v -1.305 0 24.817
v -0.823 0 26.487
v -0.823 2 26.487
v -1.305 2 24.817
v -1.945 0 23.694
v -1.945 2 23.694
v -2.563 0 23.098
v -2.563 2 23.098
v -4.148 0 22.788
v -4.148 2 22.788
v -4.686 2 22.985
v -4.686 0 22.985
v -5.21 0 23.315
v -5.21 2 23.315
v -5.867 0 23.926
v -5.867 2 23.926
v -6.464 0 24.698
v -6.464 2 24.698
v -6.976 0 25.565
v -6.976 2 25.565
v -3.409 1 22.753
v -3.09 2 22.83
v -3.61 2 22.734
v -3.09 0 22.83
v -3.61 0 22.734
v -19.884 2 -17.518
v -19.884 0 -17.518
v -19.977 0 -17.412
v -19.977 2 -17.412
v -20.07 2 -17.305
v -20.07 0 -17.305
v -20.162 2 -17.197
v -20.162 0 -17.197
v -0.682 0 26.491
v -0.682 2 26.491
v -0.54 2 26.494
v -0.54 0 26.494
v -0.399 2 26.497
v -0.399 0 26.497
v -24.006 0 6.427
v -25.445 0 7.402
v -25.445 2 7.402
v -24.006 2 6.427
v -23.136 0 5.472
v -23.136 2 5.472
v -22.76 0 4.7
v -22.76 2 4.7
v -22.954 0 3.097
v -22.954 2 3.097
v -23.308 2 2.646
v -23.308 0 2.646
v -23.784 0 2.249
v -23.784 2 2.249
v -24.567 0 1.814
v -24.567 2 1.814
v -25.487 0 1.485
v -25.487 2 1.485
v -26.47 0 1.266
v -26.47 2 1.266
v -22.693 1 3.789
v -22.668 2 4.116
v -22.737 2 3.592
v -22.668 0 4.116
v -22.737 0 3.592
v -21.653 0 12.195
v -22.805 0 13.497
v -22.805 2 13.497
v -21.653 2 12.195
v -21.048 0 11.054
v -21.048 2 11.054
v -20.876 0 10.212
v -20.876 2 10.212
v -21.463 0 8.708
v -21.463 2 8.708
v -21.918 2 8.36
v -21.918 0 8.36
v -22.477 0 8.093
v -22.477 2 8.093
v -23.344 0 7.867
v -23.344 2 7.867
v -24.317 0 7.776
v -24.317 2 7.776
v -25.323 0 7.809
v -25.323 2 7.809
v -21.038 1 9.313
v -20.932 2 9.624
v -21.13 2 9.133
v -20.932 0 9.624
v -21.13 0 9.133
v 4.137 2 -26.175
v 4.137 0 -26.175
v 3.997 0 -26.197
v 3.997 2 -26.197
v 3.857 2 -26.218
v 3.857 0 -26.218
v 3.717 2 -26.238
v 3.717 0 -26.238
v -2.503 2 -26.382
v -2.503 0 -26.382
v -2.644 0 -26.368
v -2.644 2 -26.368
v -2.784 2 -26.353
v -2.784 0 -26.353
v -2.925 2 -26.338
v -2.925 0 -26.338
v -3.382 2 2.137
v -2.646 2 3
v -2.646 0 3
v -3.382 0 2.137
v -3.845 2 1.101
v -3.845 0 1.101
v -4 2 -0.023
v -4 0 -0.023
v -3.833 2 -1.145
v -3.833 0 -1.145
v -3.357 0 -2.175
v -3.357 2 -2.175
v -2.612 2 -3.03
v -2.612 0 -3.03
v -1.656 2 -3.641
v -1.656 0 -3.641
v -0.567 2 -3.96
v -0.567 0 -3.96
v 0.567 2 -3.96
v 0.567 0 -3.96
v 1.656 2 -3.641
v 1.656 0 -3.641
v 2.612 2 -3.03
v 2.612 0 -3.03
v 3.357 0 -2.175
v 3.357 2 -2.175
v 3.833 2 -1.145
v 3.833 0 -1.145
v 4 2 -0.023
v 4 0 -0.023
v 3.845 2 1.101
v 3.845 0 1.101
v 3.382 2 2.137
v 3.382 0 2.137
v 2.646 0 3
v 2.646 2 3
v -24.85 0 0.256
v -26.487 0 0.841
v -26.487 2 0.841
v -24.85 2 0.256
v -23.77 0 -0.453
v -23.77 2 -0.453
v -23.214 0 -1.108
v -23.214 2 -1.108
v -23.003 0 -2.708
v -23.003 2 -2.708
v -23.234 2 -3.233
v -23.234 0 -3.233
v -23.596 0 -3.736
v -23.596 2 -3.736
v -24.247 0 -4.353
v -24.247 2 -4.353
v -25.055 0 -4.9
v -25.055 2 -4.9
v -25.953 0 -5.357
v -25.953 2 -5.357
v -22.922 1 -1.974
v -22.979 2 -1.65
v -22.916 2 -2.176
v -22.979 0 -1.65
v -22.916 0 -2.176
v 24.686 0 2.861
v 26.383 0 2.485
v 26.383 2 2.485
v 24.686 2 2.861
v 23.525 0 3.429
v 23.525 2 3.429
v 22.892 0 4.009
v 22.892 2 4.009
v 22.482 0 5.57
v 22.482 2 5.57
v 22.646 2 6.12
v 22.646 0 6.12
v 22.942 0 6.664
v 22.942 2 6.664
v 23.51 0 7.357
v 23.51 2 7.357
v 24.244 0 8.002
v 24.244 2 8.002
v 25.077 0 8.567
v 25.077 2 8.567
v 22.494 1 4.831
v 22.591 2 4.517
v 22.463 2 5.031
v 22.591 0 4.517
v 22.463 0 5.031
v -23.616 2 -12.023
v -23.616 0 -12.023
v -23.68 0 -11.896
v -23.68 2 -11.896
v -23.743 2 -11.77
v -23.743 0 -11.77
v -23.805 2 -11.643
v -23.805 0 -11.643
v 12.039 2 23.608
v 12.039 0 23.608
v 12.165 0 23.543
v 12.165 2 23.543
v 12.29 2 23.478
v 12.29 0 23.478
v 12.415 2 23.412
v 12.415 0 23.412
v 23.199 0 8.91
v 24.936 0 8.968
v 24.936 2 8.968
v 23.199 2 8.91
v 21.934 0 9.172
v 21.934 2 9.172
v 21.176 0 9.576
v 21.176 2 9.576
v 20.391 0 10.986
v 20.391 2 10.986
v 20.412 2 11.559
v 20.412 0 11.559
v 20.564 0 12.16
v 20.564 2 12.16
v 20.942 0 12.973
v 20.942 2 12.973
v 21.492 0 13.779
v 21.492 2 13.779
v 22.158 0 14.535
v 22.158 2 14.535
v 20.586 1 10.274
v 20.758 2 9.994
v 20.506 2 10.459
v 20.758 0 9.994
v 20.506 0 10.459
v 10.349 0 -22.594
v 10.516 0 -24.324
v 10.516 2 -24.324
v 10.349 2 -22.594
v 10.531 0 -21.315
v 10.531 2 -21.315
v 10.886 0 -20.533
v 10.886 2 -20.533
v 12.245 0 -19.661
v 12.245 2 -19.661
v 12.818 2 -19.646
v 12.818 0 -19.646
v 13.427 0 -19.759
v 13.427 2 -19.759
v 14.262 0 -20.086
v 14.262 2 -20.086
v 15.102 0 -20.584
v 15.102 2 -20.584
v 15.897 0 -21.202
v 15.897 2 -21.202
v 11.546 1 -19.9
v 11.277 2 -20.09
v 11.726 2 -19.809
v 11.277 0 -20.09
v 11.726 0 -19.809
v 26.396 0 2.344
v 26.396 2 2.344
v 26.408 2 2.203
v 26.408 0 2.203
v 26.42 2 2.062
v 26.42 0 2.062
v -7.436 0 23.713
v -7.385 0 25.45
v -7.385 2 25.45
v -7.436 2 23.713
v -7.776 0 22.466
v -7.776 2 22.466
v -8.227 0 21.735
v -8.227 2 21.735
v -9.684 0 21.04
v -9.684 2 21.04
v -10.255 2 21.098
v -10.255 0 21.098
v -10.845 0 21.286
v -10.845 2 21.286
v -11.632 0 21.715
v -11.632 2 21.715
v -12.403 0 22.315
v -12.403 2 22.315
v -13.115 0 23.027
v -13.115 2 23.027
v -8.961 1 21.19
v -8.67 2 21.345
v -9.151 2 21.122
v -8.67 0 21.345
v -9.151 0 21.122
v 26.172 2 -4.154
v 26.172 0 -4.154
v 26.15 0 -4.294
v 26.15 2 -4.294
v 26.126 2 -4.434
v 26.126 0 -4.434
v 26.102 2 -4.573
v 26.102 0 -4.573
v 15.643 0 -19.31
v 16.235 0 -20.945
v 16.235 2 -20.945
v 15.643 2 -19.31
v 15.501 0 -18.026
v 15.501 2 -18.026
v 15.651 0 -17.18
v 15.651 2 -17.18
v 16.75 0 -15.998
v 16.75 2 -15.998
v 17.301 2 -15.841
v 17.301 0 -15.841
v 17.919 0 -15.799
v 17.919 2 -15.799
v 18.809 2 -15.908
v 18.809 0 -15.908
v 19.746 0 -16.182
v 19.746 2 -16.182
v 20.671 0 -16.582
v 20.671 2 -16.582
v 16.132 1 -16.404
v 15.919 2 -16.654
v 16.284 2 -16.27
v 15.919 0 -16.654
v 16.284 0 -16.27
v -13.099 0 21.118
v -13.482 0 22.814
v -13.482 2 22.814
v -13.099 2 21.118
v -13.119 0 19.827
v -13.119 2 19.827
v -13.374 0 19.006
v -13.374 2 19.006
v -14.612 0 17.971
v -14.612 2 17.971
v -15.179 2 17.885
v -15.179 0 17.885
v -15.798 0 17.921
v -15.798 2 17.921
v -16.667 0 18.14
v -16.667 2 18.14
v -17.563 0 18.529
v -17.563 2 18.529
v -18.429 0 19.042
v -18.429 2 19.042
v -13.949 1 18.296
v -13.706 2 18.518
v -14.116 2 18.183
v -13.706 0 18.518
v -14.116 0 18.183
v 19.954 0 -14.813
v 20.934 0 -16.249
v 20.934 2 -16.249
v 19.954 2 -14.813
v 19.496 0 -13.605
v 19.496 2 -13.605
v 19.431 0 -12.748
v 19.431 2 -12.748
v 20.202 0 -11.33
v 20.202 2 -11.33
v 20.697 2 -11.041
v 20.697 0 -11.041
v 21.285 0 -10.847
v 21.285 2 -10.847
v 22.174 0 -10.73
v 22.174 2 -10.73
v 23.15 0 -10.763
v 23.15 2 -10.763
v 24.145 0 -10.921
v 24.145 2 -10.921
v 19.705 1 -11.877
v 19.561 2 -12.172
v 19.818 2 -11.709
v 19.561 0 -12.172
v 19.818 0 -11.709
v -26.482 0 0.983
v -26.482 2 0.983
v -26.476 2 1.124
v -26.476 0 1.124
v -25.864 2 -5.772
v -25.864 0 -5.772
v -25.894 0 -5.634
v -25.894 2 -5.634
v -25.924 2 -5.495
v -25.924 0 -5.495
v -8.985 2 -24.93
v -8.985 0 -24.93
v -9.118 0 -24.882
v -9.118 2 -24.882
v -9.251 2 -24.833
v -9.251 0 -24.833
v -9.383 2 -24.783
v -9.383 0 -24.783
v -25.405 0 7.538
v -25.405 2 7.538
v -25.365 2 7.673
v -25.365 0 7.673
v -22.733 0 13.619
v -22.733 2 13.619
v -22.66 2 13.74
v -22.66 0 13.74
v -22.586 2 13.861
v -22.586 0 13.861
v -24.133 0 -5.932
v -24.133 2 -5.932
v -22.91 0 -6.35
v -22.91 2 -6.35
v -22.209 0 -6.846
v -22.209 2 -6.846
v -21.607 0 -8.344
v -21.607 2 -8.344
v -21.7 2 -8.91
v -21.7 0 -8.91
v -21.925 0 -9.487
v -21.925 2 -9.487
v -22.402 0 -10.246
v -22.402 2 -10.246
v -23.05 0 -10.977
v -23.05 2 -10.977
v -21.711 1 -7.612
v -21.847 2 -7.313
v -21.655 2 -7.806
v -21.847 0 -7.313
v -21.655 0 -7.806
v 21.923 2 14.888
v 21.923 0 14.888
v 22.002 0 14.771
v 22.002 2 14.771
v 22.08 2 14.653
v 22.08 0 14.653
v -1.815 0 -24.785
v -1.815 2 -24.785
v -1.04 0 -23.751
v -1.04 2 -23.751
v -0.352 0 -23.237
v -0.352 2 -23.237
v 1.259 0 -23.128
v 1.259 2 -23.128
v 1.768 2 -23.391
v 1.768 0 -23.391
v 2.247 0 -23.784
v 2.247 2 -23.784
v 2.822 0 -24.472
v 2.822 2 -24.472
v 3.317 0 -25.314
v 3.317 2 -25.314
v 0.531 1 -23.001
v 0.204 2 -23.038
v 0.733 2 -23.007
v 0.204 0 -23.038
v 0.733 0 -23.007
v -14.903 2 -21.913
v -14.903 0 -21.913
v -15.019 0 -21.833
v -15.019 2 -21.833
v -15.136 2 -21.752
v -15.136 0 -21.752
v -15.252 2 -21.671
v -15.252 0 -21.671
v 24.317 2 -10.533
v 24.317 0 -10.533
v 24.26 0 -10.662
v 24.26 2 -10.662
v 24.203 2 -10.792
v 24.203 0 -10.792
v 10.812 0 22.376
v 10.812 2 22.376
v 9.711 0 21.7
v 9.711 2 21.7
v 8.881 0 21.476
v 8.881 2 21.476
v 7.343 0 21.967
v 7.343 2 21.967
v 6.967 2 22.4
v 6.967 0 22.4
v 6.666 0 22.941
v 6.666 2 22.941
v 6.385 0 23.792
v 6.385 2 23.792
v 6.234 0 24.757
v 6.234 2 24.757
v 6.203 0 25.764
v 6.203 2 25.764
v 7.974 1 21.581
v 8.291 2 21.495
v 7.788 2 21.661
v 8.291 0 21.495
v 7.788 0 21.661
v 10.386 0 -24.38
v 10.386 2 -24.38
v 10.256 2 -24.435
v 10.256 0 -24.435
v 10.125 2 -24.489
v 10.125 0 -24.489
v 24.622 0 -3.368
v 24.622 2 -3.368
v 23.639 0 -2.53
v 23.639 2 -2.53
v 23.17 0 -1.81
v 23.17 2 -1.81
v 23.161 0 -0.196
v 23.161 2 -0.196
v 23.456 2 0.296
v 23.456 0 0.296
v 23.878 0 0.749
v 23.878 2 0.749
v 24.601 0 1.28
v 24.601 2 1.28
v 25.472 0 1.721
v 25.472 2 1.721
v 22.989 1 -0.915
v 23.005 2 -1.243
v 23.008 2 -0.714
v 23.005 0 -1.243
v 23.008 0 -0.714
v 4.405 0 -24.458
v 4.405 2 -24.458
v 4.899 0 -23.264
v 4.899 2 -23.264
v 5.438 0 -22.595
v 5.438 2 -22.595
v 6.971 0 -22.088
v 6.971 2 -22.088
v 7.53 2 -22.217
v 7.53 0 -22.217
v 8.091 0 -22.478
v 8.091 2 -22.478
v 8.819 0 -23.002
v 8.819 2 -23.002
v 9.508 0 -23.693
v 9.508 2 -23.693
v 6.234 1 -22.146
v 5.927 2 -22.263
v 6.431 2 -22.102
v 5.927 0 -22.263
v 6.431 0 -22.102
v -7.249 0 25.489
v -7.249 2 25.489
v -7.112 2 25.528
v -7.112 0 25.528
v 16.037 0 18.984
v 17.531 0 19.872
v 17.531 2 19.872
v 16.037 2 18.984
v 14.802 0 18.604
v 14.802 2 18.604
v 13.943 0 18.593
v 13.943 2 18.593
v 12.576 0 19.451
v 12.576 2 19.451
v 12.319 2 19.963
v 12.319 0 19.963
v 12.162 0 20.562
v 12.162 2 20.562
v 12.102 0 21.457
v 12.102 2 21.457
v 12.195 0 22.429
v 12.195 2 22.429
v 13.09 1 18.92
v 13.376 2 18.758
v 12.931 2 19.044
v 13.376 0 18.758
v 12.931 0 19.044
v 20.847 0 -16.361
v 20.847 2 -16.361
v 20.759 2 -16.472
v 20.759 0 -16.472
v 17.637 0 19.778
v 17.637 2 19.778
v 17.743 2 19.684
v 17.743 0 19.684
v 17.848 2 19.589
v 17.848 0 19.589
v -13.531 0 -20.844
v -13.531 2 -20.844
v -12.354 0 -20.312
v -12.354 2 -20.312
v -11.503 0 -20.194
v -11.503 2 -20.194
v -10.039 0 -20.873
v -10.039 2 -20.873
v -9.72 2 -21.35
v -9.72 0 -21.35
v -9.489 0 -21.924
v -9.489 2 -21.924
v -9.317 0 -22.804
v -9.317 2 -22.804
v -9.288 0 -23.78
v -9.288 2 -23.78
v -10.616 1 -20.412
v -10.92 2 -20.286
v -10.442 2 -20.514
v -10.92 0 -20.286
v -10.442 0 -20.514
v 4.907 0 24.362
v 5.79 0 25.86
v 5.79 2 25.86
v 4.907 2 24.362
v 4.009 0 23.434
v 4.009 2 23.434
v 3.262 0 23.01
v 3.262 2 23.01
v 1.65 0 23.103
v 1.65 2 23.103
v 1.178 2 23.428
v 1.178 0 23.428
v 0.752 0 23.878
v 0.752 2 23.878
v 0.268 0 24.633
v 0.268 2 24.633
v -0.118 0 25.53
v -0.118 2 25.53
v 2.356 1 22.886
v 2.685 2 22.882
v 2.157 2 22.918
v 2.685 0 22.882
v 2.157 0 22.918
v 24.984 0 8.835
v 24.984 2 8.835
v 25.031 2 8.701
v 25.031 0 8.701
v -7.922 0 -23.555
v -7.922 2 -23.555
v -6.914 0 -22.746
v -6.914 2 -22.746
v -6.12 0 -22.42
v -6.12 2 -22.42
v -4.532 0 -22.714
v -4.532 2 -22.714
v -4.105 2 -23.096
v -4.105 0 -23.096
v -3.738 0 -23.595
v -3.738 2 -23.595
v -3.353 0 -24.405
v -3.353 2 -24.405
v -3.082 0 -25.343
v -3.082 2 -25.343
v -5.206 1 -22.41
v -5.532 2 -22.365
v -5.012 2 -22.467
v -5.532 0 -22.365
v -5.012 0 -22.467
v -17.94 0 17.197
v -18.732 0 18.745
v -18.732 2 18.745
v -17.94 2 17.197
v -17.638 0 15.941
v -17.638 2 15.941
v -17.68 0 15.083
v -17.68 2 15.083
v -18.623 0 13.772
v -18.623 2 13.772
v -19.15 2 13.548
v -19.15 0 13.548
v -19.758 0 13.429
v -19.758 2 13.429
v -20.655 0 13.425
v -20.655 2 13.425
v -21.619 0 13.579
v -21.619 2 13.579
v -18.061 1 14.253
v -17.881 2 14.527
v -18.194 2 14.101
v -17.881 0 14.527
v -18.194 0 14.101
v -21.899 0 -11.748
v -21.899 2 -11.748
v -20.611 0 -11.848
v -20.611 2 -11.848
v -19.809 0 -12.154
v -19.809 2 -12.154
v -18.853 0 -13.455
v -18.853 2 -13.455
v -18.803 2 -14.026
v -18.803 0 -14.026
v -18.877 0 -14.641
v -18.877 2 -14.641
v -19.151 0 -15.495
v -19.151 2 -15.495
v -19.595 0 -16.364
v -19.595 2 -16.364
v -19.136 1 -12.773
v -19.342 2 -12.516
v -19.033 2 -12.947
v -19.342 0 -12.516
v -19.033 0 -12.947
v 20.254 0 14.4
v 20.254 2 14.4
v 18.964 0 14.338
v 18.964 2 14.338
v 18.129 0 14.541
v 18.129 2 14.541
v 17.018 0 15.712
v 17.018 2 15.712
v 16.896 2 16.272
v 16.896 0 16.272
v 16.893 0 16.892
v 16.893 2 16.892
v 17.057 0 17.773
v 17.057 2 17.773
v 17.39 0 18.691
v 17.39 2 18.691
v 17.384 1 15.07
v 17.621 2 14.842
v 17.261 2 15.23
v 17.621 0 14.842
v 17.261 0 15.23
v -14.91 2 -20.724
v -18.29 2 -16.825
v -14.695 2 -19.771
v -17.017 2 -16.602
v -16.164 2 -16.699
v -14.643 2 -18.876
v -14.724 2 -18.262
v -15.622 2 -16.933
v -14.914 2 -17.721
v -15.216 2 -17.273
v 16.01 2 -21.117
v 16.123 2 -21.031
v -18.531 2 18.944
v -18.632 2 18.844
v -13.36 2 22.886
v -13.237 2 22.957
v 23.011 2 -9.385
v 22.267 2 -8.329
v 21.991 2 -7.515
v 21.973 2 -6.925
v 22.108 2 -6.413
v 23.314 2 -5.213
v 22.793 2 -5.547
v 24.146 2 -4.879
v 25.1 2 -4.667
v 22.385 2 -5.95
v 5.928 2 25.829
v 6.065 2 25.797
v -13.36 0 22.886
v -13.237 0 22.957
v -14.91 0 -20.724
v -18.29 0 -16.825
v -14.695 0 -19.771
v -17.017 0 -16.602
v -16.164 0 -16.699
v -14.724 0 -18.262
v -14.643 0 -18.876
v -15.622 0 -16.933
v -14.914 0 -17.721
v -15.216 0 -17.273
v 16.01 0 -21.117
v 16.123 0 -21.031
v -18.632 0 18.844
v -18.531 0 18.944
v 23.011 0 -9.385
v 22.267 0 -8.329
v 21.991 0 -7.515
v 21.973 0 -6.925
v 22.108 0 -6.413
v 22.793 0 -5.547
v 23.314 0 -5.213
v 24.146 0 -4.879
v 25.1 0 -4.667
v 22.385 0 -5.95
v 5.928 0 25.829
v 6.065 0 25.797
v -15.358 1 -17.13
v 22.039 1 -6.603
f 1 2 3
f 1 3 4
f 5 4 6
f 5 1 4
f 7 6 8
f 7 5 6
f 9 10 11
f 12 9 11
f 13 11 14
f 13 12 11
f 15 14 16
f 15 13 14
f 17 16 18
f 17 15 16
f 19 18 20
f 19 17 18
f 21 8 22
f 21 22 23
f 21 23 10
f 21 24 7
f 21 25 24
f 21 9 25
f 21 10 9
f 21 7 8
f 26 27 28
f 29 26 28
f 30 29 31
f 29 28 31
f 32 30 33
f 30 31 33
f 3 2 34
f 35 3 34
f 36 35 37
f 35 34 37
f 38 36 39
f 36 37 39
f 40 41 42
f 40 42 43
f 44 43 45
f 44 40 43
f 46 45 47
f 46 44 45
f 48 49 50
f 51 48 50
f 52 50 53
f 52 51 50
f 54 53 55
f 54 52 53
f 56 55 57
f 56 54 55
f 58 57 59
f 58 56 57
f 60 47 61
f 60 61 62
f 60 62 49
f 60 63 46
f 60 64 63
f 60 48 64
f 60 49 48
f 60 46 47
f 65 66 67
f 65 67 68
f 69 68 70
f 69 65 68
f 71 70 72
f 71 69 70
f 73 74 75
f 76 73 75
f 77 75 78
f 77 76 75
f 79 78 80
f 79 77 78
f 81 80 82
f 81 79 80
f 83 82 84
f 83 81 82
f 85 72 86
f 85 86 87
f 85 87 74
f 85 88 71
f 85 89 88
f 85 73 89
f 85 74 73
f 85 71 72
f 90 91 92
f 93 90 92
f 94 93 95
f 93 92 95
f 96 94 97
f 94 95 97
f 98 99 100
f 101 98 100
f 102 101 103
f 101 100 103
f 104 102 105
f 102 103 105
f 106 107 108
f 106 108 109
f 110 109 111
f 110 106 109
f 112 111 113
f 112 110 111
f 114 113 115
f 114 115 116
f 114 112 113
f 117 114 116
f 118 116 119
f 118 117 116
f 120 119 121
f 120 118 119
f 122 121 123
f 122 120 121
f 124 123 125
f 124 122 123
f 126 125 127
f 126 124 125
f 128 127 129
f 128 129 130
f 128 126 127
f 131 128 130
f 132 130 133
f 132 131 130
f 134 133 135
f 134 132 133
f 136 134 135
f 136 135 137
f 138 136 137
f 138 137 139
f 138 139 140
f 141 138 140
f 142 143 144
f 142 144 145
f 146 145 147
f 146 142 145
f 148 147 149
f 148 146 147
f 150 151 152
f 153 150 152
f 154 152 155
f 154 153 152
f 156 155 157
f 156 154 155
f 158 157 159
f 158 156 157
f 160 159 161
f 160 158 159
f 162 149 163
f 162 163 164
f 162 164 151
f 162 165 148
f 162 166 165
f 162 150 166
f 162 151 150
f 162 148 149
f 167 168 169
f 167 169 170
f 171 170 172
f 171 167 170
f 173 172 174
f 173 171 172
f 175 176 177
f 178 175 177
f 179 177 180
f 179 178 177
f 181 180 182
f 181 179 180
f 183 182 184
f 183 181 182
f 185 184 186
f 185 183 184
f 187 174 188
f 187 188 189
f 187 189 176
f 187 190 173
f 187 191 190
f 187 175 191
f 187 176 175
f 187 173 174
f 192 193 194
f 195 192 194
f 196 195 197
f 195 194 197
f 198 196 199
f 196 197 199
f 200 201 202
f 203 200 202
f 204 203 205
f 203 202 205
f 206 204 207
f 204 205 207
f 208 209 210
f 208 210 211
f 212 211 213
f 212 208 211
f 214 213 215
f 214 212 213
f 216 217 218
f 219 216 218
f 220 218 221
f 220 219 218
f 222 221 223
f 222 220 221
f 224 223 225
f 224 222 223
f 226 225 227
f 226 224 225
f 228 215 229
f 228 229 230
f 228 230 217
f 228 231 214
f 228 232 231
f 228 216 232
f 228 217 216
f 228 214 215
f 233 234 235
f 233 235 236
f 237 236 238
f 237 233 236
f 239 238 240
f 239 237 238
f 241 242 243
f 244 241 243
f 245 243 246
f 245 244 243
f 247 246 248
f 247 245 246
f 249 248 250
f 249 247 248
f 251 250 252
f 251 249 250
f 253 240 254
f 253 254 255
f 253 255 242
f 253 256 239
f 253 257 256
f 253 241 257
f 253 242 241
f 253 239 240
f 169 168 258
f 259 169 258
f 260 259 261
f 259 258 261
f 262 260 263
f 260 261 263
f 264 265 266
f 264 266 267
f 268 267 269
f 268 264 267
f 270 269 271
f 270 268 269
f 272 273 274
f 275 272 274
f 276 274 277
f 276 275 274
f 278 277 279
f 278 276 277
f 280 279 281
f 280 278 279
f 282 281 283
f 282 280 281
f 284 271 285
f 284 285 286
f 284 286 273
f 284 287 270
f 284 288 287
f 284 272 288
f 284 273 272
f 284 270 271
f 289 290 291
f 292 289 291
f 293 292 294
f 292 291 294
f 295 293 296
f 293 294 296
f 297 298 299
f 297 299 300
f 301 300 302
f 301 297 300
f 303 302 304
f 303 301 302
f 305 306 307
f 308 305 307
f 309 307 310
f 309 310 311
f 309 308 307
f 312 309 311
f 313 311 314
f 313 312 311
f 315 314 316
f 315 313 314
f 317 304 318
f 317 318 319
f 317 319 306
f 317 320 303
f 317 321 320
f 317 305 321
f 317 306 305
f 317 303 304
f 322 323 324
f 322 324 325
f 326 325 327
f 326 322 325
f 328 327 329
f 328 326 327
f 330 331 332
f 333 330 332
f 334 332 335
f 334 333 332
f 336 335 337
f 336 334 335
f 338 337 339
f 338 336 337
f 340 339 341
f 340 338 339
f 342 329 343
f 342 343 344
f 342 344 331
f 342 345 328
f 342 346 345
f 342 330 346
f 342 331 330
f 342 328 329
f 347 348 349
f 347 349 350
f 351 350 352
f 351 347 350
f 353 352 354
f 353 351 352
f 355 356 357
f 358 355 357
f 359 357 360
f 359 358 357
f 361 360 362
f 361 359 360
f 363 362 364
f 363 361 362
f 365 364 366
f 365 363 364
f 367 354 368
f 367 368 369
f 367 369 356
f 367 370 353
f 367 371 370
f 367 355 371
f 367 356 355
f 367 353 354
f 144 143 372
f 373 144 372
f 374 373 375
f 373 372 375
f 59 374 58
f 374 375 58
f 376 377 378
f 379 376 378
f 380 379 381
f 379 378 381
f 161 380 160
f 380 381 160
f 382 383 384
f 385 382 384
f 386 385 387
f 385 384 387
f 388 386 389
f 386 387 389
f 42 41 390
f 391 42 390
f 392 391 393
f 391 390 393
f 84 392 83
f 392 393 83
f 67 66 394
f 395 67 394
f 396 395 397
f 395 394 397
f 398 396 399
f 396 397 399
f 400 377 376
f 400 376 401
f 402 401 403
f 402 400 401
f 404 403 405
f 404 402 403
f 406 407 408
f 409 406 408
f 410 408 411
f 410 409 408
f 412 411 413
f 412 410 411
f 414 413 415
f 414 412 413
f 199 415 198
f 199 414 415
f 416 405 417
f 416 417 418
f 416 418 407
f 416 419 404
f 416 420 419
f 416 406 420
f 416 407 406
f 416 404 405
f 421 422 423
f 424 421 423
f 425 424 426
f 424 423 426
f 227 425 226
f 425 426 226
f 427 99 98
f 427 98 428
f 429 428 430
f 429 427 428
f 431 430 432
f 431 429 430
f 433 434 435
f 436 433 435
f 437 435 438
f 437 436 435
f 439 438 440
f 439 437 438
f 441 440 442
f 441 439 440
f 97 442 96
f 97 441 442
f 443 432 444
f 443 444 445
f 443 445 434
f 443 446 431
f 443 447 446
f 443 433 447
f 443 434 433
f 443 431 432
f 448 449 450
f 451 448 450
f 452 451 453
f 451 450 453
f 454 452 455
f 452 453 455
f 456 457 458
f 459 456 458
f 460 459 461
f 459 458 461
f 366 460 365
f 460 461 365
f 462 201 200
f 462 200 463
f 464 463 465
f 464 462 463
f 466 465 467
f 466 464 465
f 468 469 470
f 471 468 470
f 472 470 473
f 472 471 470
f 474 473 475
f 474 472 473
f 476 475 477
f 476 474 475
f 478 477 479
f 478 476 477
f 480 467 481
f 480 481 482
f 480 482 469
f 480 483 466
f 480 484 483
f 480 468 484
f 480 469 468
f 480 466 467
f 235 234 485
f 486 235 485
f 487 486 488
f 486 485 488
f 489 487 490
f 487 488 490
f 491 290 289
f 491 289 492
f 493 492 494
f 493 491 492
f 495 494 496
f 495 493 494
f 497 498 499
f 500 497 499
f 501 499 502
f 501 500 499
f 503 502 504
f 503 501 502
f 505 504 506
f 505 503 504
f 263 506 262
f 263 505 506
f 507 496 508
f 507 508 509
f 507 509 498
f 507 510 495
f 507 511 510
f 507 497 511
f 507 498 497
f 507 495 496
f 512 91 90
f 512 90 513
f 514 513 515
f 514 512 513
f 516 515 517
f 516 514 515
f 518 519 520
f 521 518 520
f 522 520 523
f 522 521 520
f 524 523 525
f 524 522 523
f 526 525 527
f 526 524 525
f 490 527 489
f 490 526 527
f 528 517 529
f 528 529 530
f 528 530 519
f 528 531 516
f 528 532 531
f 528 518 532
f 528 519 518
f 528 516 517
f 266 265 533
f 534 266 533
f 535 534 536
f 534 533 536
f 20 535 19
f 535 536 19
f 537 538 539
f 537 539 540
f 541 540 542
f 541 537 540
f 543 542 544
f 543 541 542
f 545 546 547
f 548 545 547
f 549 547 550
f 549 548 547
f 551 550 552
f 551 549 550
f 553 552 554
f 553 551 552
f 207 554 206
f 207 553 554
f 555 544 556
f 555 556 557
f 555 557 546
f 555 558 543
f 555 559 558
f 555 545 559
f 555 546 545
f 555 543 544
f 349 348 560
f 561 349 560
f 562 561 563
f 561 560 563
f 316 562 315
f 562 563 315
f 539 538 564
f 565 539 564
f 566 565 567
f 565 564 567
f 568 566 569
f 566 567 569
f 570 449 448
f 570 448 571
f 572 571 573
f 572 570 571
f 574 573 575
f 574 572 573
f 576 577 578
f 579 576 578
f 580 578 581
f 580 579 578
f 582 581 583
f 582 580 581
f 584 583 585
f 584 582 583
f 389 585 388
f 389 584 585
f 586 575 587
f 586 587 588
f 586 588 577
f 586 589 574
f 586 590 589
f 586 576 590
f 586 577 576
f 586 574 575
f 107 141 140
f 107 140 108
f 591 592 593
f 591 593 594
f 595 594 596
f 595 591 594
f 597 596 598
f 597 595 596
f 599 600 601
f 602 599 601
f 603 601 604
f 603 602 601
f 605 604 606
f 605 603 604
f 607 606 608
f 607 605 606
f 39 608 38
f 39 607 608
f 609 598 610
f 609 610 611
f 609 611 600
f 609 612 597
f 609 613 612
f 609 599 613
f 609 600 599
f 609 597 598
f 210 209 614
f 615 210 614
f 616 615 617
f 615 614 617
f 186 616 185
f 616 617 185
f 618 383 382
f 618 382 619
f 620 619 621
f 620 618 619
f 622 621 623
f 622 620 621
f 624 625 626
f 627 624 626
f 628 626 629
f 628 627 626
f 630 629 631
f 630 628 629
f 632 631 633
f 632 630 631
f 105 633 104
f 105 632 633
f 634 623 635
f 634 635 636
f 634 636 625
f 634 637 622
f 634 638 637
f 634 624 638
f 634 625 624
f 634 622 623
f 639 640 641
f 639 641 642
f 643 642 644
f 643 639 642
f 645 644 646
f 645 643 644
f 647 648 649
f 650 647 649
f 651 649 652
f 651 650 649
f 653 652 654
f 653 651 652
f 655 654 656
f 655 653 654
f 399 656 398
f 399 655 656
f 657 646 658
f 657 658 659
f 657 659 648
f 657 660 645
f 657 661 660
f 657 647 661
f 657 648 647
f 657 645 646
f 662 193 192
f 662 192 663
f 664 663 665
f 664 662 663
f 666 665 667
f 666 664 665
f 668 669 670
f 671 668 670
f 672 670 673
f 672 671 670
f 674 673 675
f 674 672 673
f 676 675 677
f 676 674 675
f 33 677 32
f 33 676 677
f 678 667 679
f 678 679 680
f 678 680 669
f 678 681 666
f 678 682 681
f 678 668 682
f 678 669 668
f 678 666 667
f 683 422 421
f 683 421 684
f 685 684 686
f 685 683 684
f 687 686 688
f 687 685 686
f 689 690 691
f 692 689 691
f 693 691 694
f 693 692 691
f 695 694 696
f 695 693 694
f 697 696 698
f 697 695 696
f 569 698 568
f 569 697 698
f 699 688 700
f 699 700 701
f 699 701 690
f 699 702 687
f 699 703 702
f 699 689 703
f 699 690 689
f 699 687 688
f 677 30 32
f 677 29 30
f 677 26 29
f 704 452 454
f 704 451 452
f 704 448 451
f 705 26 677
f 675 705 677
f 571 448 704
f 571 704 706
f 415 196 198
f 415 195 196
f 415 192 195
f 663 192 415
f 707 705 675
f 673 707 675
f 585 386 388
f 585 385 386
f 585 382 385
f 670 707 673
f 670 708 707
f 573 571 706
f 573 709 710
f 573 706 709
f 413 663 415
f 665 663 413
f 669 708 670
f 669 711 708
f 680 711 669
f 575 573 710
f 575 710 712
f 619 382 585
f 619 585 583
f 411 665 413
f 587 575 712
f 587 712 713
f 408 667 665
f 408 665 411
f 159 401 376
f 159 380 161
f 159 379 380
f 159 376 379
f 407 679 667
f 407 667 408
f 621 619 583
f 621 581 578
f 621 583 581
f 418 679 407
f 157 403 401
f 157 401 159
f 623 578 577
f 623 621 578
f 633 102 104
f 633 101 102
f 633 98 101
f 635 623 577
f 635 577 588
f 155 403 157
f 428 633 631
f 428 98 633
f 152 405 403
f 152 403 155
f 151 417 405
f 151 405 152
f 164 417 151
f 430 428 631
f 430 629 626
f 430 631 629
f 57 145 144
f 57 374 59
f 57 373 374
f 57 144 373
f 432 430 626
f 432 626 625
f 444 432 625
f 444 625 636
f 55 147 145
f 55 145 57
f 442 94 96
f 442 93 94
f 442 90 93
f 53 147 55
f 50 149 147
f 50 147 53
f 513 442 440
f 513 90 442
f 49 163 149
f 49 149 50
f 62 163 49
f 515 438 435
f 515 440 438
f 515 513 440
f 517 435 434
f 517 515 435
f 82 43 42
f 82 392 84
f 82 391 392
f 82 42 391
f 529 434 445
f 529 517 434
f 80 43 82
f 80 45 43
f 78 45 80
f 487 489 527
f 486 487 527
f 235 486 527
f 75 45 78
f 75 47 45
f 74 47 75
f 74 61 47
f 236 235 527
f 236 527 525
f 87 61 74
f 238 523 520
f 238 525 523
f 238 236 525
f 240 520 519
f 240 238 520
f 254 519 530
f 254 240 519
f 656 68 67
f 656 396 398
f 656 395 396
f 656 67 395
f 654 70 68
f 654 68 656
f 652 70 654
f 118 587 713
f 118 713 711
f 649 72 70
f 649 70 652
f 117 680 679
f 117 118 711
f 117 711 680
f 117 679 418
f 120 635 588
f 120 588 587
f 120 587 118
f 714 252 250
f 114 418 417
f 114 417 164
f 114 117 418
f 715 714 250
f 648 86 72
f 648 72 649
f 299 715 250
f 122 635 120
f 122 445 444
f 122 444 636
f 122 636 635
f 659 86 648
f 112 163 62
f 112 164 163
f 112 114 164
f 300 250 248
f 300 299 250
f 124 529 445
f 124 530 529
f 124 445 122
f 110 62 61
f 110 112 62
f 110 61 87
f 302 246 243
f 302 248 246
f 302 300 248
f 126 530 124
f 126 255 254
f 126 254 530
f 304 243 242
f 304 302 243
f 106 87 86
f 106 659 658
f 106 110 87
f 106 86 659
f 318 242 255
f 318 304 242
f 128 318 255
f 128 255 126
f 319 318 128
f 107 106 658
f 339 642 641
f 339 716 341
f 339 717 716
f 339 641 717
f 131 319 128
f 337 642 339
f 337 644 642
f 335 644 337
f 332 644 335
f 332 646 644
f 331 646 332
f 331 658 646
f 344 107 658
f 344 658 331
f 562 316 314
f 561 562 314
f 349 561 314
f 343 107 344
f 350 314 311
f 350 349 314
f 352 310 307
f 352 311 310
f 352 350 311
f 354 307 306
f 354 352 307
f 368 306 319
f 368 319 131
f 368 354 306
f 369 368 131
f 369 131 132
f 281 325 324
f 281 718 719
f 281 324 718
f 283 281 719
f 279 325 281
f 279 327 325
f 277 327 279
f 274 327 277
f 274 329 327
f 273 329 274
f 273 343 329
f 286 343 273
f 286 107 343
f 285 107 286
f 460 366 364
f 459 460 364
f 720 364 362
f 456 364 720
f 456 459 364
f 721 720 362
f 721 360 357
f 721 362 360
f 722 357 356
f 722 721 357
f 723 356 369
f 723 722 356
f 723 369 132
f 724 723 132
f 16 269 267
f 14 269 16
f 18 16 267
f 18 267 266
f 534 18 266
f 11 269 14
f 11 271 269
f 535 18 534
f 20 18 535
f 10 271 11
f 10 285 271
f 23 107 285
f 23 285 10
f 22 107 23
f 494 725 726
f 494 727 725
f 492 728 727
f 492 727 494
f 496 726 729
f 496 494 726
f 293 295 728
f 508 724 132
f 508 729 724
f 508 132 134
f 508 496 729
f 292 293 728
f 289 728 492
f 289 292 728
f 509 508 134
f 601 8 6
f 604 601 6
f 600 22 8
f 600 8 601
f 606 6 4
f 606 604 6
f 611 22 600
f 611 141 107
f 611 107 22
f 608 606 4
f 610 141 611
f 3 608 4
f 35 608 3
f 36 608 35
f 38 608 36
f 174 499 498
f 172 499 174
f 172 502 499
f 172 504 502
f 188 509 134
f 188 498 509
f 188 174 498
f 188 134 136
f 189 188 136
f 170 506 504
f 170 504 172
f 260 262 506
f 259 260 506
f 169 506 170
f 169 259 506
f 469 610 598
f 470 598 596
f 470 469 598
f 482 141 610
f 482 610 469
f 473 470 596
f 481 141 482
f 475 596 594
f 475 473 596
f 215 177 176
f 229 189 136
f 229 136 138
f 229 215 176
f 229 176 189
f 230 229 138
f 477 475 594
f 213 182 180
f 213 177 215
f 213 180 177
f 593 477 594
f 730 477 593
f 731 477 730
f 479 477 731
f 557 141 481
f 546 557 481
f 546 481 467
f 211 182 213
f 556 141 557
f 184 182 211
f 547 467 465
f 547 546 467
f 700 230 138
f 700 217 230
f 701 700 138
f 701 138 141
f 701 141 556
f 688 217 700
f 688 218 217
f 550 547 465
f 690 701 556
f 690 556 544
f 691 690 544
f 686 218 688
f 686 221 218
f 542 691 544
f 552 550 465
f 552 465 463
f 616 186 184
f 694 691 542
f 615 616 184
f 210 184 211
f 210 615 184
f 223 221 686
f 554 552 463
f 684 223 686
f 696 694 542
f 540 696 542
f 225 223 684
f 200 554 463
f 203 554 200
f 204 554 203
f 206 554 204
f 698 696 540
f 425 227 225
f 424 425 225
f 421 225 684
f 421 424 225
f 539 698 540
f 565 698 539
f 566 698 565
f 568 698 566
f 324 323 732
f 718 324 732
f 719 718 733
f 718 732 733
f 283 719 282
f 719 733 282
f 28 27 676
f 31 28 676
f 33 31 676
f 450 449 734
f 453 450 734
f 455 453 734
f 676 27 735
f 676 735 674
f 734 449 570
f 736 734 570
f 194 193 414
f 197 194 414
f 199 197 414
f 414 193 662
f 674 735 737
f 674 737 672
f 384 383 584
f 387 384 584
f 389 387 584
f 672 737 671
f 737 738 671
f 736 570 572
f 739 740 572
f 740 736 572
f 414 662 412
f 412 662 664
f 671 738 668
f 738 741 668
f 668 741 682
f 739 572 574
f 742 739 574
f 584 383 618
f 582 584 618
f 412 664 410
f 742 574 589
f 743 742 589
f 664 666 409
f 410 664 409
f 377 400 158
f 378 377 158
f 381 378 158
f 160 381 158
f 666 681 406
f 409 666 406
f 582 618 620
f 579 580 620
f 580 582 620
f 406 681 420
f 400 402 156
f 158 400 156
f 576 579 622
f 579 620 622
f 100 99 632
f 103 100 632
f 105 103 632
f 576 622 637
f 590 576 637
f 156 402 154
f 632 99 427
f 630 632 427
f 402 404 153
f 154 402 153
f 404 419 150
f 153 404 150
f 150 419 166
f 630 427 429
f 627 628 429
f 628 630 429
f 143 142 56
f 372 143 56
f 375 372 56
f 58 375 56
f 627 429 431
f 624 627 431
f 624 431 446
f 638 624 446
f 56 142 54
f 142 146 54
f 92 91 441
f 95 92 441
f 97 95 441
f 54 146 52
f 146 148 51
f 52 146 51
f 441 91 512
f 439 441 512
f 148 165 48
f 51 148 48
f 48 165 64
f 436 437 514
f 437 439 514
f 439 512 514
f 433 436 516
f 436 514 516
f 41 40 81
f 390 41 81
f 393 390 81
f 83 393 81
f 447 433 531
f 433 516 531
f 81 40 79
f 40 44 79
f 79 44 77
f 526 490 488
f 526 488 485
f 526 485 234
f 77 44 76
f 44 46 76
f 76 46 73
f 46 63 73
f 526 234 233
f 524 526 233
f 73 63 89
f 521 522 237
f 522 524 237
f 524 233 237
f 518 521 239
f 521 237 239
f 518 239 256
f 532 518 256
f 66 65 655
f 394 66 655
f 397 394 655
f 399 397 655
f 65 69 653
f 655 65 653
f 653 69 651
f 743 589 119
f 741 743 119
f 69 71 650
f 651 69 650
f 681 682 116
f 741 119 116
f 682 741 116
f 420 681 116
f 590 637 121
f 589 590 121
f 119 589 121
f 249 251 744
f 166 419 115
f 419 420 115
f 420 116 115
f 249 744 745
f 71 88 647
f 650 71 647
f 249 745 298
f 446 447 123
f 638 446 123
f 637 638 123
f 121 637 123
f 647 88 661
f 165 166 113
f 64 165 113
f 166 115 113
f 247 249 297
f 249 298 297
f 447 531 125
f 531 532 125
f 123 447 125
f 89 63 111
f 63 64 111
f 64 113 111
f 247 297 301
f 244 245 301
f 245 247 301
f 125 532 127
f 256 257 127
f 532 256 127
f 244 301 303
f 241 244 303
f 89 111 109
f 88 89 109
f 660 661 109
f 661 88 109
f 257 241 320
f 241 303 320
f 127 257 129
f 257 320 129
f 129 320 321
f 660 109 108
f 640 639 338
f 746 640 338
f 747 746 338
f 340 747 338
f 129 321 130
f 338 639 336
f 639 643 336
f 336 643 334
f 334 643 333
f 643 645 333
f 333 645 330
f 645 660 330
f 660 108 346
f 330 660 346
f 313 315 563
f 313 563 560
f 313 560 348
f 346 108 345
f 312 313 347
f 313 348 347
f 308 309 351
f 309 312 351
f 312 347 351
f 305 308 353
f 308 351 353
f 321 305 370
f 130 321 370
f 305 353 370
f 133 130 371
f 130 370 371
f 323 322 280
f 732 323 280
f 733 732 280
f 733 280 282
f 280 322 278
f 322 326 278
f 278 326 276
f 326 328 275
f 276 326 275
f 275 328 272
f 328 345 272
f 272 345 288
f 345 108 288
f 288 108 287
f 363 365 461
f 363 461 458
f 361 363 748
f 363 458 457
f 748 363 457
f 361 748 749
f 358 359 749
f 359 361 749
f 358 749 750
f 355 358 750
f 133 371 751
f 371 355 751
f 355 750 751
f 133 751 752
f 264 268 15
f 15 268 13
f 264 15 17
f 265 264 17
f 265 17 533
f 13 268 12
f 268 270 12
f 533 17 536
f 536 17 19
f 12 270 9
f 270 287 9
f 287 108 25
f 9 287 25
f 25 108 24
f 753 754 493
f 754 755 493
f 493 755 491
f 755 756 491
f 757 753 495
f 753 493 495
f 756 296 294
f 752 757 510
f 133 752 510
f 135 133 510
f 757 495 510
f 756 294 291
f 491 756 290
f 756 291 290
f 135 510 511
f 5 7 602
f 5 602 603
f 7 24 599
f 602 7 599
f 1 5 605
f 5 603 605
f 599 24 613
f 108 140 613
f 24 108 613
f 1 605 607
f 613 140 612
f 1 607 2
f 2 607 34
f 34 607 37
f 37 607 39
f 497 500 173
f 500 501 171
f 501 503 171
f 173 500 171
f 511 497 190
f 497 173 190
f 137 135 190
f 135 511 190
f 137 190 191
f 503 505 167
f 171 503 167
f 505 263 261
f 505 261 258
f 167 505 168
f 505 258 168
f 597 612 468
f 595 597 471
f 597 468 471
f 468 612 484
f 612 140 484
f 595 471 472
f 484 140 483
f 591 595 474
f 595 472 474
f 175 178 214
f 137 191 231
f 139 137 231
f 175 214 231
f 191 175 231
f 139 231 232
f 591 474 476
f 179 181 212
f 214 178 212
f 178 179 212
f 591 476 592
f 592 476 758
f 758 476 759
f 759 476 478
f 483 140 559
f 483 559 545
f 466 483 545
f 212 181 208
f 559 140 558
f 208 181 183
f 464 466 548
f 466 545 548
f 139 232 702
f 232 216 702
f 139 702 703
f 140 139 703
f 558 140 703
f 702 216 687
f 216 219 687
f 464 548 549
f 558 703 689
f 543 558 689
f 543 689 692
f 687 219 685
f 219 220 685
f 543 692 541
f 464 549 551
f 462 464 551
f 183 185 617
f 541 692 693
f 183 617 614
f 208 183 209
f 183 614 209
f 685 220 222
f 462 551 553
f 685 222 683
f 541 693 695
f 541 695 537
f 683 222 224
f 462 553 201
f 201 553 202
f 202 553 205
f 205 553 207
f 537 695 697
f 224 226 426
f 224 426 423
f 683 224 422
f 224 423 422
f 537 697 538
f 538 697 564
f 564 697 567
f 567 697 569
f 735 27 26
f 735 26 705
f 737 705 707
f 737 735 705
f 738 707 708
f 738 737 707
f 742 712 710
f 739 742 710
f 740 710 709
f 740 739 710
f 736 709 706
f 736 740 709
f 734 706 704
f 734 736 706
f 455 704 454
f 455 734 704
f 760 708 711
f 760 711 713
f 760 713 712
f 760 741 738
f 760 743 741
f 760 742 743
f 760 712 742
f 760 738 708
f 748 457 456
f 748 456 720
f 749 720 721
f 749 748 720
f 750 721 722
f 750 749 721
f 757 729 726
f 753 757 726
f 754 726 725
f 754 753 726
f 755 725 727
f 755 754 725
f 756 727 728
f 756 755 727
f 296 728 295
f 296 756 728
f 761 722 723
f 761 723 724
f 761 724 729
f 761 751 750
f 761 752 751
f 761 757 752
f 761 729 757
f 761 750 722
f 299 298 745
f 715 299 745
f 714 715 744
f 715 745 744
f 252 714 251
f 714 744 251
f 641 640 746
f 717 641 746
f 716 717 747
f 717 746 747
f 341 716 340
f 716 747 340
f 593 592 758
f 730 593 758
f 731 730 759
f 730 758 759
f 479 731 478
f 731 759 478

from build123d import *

# Parameters (mm, degrees)
SKETCH1_R           = 26.5
BOSS_EXTRUDE1_DEPTH = 2
CUT_EXTRUDE1_START  = -2
CUT_EXTRUDE1_DEPTH  = 2
CIRPATTERN2_COUNT   = 25
CUT_EXTRUDE2_DEPTH  = 2


with BuildPart() as part:
    # Sketch1 → Boss-Extrude1 (new body)
    with BuildSketch(Plane(origin=(0, 0, 0), x_dir=(1, 0, 0), z_dir=(0, 1, 0))):
        with Locations(Location((0, 0, 0), (0, 0, 270))):
            Circle(SKETCH1_R)
    extrude(amount=BOSS_EXTRUDE1_DEPTH)

    # Sketch2 → Cut-Extrude1 (cut)
    with BuildSketch(Plane(origin=(0, 2, 0), x_dir=(1, 0, 0), z_dir=(0, 1, 0)).offset(CUT_EXTRUDE1_START)):
        with BuildLine():
            ThreePointArc((20.67056927, 16.582447529), (18.581221902, 18.894131169), (16.234972011, 20.944586026))
            add(Edge.make_bspline(
                [(16.234972011, 20.944586026), (12.135241932, 12.33960038), (20.67056927, 16.582447529)],
                knots=[0, 0, 0, 1, 1, 1], degree=2, weights=[1, 0.580612476, 1]))
        make_face()
    cut_extrude1 = extrude(amount=CUT_EXTRUDE1_DEPTH, mode=Mode.SUBTRACT)

    # CirPattern2: Cut-Extrude1 ×25 about axis
    cirpattern2_axis = Axis((0, 2, 0), (0, -1, 0))
    for i in range(1, CIRPATTERN2_COUNT):
        add(cut_extrude1.rotate(cirpattern2_axis, i * 360 / CIRPATTERN2_COUNT), mode=Mode.SUBTRACT)

    # Sketch4 → Cut-Extrude2 (cut)
    with BuildSketch(Plane(origin=(0, 2, 0), x_dir=(1, 0, 0), z_dir=(0, 1, 0))):
        with BuildLine():
            Line((2.645751311, -3), (-2.645751311, -3))
            ThreePointArc((-2.645751311, -3), (0, 4), (2.645751311, -3))
        make_face()
    extrude(amount=-CUT_EXTRUDE2_DEPTH, mode=Mode.SUBTRACT)


solid = part.part
